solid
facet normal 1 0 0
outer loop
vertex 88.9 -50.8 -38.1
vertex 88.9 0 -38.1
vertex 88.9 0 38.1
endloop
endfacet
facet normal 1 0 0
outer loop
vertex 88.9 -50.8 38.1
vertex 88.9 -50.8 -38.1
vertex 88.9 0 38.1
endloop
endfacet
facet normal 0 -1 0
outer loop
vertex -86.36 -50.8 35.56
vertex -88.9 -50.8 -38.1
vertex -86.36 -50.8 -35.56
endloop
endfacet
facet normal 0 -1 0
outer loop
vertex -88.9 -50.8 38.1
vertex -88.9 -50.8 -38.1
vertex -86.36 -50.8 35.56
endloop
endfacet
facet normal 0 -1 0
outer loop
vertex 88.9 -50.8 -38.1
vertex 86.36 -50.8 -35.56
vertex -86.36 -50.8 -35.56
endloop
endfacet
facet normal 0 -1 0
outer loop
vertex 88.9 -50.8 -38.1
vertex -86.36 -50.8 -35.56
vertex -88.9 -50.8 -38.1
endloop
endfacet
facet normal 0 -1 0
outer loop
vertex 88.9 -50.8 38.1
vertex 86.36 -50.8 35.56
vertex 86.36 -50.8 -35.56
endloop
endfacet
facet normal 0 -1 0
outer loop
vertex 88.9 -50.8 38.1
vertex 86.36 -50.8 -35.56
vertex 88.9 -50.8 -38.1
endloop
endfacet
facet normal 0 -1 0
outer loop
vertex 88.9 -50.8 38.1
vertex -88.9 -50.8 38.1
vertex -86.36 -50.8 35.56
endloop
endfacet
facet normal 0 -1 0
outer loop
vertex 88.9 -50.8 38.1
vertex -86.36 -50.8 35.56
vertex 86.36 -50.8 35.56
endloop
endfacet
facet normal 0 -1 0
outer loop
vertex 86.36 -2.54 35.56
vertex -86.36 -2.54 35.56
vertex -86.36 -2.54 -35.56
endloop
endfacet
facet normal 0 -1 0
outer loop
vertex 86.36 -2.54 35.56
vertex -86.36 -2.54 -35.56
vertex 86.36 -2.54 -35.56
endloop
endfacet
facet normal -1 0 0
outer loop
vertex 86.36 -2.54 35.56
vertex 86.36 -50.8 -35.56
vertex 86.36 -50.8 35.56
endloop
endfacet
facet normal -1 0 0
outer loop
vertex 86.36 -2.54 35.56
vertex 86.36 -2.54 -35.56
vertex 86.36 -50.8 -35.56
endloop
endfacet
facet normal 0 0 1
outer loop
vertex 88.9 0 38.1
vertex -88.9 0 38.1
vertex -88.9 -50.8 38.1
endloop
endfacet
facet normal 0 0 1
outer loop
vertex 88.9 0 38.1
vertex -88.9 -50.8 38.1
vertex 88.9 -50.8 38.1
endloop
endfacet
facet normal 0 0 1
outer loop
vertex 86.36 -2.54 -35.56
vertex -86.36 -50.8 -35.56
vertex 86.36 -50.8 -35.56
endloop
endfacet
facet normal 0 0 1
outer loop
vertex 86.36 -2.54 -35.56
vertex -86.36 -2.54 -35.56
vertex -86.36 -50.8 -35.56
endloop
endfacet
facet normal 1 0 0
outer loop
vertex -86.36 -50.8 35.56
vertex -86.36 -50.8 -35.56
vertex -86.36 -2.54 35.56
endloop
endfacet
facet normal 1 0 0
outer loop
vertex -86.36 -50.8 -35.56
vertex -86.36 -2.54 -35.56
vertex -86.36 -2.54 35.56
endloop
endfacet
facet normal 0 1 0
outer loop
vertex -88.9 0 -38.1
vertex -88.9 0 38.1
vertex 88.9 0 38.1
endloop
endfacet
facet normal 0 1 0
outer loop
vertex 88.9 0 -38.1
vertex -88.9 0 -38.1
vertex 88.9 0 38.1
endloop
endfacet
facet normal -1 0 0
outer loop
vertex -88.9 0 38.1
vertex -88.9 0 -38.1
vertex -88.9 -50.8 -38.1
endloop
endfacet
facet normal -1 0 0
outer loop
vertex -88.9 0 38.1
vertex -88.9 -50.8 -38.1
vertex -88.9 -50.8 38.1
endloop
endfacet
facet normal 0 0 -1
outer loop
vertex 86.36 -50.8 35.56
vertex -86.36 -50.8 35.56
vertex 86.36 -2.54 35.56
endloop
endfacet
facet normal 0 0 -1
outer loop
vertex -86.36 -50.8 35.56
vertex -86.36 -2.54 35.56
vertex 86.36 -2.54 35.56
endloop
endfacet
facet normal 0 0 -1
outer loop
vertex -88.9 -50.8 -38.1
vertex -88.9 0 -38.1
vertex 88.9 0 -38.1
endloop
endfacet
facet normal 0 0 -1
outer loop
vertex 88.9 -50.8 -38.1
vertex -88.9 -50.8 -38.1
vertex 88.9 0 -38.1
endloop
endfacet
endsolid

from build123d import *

# Parameters (mm, degrees)
F0_W     = 177.8
F0_H     = 76.2
F1_DEPTH = 50.8
F3_T     = -2.54


# Not quite as in the source:
# - the program builds the solid bodies; features that only make, move or delete a surface that nothing else refers to are left out


with BuildPart() as f1:
    # F0 (on Front) → F1 (new body)
    with BuildSketch(Plane.XZ):
        Rectangle(F0_W, F0_H)
    extrude(amount=F1_DEPTH)

    # F3
    f3_openings = [f1.faces().sort_by_distance(p)[0] for p in [
        (0, -50.8, 0),
    ]]
    offset(amount=F3_T, openings=f3_openings)


solid = f1.part
